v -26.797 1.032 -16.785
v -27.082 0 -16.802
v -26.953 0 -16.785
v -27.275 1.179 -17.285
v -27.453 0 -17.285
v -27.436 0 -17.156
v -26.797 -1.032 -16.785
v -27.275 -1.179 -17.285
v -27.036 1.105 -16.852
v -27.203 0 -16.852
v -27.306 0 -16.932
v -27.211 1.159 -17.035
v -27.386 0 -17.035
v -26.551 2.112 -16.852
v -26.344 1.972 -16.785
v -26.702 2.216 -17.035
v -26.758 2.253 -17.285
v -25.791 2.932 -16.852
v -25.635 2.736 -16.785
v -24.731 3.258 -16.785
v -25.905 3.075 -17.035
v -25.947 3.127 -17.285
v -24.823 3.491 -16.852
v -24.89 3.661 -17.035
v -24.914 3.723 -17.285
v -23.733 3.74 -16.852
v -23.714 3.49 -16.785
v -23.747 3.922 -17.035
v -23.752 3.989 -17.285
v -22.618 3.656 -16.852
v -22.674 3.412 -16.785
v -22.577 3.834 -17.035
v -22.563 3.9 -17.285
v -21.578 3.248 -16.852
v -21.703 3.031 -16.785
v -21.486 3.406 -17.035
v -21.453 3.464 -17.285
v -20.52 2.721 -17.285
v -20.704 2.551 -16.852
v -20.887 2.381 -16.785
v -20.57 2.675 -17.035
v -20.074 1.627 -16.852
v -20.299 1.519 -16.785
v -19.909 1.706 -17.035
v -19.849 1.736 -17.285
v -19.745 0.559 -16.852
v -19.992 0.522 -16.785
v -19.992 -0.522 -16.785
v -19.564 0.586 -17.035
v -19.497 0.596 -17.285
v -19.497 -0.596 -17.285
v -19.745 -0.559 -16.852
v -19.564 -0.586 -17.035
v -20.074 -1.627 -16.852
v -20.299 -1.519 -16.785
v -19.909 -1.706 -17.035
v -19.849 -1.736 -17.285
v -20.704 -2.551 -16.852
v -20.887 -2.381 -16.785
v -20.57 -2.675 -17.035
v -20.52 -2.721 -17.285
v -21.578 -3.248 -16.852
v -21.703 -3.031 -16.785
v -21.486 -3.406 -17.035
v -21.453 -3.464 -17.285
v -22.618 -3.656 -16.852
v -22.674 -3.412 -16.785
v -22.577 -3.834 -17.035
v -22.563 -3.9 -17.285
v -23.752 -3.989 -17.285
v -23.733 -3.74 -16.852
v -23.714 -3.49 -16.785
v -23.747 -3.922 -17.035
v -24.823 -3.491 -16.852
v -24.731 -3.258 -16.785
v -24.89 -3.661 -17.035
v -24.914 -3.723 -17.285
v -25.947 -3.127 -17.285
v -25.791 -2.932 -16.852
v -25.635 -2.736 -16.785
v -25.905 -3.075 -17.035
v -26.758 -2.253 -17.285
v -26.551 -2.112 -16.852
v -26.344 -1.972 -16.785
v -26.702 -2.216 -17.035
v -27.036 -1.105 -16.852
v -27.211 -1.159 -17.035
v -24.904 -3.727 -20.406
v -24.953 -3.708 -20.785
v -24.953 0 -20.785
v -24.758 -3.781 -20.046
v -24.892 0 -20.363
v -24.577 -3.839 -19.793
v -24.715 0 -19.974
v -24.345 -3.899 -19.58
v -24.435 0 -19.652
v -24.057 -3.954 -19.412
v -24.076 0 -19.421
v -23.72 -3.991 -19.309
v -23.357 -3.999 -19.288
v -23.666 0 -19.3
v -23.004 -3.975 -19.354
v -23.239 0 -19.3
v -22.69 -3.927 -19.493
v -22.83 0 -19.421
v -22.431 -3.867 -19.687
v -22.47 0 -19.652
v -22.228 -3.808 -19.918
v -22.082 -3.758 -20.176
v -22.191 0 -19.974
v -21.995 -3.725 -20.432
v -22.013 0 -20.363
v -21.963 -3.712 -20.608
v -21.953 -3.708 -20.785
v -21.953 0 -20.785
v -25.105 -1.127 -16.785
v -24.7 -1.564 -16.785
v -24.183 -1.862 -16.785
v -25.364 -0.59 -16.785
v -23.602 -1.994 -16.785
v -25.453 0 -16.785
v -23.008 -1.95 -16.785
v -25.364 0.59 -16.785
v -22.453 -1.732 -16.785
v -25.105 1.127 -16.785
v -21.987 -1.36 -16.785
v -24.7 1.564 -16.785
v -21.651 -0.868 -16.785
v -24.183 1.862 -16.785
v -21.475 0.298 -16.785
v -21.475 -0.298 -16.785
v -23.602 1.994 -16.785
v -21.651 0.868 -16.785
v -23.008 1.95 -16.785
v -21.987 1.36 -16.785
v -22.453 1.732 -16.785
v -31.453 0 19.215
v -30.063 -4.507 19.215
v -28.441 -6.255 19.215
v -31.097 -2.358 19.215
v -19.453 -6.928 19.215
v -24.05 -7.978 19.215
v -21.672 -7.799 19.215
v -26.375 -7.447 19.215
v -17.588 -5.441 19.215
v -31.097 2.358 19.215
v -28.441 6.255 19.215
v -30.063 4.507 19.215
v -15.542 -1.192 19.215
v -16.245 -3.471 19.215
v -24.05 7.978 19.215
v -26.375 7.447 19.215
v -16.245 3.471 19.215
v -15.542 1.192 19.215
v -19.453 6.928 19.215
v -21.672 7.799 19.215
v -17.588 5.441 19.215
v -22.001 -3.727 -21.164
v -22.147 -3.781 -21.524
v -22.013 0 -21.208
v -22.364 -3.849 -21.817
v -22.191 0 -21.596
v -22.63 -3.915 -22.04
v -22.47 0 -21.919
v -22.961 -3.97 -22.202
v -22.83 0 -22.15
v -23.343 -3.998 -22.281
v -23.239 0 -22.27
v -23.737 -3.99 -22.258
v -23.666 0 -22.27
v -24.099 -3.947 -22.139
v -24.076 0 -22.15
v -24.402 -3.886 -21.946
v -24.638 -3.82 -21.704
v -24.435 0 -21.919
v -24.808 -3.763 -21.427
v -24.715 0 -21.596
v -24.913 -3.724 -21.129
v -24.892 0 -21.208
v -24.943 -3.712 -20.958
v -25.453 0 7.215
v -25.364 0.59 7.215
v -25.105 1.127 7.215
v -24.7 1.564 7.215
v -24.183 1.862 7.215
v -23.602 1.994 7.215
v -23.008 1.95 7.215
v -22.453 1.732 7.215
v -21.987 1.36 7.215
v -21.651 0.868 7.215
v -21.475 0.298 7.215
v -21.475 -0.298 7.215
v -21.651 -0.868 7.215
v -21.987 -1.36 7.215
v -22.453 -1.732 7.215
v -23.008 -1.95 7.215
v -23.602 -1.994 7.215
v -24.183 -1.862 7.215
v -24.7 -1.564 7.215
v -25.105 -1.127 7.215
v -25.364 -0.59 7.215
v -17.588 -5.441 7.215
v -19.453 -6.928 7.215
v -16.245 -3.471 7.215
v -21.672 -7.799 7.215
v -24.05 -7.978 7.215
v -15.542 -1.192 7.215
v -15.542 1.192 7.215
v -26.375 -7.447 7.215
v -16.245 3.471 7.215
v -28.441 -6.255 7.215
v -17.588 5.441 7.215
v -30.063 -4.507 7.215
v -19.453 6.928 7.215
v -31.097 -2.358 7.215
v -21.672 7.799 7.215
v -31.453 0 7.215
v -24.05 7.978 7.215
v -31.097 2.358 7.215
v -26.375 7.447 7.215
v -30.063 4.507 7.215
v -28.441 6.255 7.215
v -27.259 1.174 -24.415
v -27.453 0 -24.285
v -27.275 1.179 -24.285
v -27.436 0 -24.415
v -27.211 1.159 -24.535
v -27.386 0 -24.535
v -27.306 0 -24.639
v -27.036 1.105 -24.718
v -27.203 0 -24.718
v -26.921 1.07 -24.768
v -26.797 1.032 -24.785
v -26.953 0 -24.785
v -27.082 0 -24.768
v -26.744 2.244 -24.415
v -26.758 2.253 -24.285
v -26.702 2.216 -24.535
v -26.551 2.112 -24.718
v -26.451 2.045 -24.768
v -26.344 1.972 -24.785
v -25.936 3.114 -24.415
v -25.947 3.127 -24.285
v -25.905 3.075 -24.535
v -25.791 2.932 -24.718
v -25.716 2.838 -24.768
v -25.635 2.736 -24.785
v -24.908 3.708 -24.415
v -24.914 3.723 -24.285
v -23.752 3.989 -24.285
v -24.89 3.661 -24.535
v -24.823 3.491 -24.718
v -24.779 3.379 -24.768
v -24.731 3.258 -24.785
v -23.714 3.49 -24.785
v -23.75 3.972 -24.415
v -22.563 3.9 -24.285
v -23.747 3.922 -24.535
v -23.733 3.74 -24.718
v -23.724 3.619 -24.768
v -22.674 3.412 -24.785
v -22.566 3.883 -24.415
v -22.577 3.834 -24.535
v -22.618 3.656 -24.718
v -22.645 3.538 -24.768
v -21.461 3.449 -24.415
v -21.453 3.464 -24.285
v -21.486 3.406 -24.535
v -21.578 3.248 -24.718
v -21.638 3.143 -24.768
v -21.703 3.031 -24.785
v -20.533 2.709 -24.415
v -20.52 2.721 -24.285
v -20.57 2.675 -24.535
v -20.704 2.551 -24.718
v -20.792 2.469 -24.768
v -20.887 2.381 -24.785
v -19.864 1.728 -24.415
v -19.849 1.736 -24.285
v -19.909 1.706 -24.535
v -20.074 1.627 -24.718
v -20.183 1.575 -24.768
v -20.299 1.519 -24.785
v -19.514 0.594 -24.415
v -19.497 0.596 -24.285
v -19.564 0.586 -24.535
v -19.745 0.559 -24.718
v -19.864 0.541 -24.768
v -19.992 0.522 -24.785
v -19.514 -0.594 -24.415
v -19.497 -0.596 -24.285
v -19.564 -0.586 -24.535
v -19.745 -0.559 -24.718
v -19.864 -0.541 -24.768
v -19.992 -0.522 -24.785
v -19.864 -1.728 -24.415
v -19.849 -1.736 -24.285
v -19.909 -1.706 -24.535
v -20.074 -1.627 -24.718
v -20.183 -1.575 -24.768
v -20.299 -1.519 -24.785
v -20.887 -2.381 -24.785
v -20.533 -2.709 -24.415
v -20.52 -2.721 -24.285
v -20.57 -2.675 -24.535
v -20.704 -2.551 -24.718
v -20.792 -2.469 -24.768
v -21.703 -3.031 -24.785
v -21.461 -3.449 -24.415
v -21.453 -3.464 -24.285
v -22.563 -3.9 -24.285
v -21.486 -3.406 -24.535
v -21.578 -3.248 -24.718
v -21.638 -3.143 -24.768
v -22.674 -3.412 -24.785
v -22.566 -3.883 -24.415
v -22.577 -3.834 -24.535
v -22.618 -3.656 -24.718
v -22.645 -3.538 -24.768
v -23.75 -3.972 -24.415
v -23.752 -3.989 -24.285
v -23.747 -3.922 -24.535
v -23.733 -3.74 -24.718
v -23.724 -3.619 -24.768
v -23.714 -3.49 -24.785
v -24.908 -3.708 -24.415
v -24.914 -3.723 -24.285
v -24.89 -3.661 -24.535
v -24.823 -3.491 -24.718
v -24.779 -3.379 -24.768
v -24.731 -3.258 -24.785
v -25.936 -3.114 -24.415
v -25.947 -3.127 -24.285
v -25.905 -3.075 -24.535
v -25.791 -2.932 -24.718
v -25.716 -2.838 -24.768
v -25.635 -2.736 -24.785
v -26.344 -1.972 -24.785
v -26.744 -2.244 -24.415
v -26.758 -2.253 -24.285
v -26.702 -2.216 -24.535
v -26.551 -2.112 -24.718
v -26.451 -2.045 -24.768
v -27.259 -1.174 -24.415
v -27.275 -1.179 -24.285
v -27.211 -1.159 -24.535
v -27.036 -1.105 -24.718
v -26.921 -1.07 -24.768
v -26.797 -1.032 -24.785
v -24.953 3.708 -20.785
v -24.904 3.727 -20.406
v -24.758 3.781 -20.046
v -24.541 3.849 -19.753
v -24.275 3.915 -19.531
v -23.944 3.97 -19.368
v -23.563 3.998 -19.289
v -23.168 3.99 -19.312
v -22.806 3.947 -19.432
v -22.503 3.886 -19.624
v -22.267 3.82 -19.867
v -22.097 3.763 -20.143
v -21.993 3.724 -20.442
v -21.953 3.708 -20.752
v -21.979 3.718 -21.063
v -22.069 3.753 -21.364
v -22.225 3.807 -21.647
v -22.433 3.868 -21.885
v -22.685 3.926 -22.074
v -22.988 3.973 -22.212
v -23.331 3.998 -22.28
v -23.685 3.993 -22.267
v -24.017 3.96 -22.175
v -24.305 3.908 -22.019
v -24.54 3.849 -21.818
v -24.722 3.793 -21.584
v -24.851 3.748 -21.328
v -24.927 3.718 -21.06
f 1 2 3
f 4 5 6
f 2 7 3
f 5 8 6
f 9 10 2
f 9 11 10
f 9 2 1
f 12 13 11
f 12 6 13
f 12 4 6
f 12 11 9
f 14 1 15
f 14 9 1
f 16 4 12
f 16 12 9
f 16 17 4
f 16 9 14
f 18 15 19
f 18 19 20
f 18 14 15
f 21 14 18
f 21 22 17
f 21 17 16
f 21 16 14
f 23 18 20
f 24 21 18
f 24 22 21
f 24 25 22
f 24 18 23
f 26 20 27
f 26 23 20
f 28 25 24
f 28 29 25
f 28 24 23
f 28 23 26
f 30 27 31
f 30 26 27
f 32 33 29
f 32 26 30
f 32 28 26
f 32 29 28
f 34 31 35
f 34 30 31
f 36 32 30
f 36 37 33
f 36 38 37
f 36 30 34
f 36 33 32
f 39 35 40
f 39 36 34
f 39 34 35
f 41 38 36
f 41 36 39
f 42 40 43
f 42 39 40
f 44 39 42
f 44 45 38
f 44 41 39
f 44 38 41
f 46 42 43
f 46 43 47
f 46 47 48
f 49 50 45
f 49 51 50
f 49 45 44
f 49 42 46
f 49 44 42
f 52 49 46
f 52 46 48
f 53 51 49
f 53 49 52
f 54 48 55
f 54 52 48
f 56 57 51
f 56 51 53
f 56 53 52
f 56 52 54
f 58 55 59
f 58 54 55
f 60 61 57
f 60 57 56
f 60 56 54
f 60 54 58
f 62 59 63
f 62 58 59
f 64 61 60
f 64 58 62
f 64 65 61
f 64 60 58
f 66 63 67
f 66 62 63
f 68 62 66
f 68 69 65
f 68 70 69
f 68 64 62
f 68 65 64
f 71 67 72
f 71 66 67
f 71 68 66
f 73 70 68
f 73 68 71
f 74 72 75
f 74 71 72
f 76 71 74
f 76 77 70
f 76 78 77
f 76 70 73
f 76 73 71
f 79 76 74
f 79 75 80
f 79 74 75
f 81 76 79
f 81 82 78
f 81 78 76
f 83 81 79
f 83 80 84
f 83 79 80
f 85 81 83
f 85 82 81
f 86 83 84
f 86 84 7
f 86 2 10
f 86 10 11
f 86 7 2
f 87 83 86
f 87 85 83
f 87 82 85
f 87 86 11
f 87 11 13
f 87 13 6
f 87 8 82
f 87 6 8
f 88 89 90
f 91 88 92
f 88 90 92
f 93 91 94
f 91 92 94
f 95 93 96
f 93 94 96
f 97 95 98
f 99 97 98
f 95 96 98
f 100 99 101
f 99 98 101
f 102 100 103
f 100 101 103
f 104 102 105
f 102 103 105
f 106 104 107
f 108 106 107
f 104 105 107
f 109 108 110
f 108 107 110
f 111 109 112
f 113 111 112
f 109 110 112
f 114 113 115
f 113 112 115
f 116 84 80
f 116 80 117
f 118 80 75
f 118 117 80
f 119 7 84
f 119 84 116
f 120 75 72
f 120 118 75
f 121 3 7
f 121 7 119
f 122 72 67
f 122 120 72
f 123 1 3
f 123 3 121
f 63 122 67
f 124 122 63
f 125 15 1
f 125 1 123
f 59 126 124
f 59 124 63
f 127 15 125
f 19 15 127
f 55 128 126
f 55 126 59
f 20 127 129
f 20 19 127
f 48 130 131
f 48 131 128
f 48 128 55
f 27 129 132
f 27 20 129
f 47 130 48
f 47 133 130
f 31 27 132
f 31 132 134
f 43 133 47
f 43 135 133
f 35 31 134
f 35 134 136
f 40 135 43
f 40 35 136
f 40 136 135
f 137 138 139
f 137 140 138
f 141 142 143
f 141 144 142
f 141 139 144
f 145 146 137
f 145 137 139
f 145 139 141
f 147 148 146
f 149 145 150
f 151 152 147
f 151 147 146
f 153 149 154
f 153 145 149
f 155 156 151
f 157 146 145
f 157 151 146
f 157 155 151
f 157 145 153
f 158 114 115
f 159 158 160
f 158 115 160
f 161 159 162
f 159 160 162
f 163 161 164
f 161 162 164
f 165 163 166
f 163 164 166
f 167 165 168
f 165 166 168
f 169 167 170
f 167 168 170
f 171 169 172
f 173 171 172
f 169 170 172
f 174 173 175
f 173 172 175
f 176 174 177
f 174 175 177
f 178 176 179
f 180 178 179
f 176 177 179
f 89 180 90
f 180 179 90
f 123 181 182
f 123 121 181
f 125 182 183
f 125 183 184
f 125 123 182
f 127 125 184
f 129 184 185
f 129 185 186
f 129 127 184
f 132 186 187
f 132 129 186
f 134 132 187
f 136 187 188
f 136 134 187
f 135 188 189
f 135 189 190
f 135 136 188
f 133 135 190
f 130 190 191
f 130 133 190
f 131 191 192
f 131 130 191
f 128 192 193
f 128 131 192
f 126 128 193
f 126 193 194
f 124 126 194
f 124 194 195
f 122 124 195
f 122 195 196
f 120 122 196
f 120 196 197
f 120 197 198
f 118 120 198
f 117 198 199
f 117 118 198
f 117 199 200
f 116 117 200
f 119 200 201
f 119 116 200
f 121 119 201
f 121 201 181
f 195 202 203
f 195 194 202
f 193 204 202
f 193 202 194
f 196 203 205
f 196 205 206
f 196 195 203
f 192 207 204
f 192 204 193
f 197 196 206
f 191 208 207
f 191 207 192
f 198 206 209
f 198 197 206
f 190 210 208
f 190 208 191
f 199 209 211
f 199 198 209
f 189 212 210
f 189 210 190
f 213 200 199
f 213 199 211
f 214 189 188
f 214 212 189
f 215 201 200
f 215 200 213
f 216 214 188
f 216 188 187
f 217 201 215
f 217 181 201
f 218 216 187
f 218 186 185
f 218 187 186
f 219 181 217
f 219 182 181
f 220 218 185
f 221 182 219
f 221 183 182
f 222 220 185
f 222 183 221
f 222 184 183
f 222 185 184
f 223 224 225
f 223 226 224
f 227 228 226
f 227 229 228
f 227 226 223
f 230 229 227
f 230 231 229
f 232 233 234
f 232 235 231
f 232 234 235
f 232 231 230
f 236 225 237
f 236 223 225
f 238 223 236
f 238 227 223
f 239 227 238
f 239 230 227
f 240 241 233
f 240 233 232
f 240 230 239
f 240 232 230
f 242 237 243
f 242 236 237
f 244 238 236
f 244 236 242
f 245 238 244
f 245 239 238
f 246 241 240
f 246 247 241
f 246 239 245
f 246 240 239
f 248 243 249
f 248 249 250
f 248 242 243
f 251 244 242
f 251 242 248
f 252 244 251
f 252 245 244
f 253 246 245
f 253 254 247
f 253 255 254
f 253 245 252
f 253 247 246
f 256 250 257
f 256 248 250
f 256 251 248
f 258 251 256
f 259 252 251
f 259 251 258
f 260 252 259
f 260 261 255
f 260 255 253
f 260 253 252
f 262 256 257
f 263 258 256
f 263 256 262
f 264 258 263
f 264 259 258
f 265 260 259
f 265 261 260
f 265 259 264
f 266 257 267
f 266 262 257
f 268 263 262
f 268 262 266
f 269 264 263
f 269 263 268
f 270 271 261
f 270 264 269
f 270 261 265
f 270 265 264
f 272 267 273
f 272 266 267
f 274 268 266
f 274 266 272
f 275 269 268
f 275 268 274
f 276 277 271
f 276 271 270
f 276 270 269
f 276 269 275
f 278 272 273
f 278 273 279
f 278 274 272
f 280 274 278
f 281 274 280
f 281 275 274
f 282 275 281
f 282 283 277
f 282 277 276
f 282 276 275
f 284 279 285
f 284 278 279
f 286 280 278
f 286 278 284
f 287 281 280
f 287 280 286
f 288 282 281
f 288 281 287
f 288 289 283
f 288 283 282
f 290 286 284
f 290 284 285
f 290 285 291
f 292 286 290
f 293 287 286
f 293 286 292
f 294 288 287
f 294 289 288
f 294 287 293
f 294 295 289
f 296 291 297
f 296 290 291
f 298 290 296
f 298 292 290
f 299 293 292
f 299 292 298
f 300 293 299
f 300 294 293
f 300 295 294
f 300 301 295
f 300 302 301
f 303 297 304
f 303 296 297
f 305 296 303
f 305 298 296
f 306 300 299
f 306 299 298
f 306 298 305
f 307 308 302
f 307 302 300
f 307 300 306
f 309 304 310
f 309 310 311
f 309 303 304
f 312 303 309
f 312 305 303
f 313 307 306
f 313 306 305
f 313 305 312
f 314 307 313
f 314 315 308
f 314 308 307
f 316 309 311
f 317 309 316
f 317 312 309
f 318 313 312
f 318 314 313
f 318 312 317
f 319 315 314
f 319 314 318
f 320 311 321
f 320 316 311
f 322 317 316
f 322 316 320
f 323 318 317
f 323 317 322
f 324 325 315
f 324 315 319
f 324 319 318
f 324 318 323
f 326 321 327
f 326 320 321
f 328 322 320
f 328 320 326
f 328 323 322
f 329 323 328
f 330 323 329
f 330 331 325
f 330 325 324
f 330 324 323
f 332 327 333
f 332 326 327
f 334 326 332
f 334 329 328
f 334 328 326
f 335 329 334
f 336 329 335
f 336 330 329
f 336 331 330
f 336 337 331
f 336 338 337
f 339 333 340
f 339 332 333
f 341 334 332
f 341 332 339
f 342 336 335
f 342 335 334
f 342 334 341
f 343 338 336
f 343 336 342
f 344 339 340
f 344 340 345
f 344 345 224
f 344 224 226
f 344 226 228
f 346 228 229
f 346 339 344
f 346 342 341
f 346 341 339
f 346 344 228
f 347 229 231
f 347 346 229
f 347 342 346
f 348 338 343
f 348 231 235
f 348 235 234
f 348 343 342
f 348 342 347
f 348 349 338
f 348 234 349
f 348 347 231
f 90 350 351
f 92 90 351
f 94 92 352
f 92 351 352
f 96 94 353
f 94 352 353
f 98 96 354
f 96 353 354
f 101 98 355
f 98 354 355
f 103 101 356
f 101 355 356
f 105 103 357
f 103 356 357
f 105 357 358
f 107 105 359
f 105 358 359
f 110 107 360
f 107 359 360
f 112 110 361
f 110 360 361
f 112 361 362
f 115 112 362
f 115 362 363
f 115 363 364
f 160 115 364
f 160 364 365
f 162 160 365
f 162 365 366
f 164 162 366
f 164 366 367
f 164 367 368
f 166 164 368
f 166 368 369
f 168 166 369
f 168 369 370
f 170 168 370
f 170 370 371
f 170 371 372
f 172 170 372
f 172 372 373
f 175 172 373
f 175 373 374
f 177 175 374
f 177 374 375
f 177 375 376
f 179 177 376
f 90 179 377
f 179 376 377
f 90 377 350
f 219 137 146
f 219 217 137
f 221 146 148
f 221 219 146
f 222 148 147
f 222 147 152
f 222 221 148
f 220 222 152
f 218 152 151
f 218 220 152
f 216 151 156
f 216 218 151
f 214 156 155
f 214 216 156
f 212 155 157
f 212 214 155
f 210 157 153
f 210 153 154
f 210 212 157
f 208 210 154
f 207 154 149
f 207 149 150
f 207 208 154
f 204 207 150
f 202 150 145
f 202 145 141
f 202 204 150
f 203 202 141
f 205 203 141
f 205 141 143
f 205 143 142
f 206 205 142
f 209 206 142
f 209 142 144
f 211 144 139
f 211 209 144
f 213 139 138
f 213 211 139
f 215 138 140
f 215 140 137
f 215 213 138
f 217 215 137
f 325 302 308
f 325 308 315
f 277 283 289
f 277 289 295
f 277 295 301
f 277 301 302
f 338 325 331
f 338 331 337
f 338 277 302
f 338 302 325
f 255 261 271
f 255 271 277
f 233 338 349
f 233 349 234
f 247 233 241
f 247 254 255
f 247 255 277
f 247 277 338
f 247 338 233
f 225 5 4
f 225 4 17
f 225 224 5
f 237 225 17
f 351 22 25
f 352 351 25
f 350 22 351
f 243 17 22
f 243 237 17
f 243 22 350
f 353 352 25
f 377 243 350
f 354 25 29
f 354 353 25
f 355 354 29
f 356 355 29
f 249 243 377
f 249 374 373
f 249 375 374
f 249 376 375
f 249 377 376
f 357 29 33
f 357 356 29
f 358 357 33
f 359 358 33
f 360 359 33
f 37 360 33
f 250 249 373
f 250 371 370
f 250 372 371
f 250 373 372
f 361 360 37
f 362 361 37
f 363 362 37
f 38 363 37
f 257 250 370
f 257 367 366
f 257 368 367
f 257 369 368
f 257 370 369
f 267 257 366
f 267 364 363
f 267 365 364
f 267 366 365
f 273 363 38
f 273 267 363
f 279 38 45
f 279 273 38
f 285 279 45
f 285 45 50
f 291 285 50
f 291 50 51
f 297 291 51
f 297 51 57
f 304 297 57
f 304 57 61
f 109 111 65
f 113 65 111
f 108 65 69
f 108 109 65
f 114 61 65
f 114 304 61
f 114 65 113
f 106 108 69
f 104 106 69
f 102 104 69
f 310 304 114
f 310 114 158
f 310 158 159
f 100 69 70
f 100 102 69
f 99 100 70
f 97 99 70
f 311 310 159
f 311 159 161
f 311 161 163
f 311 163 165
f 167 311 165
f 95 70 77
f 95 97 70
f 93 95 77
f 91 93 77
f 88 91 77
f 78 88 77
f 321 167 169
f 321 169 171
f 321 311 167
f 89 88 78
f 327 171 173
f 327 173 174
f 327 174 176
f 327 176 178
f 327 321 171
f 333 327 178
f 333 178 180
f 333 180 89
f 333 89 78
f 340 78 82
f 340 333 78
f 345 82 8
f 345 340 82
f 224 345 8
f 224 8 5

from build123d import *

# Parameters (mm, degrees)
F2_D     = 3
F2_DEPTH = 8.001
F3_D     = 3


with BuildPart() as f1:
    # F0 (on Front) → F1 (revolve)
    with BuildSketch(Plane.XZ):
        with BuildLine():
            Line((-23.4526408911, -24.7851572111), (-23.4526408911, 19.2148427889))
            Line((-23.4526408911, 19.2148427889), (-31.4526408911, 19.2148427889))
            Line((-31.4526408911, 19.2148427889), (-31.4526408911, 7.2148427889))
            Line((-31.4526408911, 7.2148427889), (-25.4526408911, 7.2148427889))
            Line((-25.4526408911, 7.2148427889), (-25.4526408911, -16.7851572111))
            Line((-25.4526408911, -16.7851572111), (-26.9526408911, -16.7851572111))
            ThreePointArc((-26.9526408911, -16.7851572111), (-27.3061942817, -16.9316038205), (-27.4526408911, -17.2851572111))
            Line((-27.4526408911, -17.2851572111), (-27.4526408911, -24.2851572111))
            ThreePointArc((-27.4526408911, -24.2851572111), (-27.3061942817, -24.6387106017), (-26.9526408911, -24.7851572111))
            Line((-26.9526408911, -24.7851572111), (-23.4526408911, -24.7851572111))
        make_face()
    revolve(axis=Axis((-23.4526408911, 0, -2.7851572111), (0, 0, -1)))

    # F2 (through all, one way)
    with BuildSketch(Plane(origin=(0, 0, 0), x_dir=(1, 0, 0), z_dir=(0, 1, 0))):
        with Locations((-23.4526408911, 20.7851572111)):
            Circle(F2_D / 2)
    extrude(amount=-F2_DEPTH, mode=Mode.SUBTRACT)

    # F3 (through all)
    with Locations(Plane.XZ):
        with Locations((-23.4526408911, -20.7851572111)):
            Hole(F3_D / 2)


solid = f1.part
